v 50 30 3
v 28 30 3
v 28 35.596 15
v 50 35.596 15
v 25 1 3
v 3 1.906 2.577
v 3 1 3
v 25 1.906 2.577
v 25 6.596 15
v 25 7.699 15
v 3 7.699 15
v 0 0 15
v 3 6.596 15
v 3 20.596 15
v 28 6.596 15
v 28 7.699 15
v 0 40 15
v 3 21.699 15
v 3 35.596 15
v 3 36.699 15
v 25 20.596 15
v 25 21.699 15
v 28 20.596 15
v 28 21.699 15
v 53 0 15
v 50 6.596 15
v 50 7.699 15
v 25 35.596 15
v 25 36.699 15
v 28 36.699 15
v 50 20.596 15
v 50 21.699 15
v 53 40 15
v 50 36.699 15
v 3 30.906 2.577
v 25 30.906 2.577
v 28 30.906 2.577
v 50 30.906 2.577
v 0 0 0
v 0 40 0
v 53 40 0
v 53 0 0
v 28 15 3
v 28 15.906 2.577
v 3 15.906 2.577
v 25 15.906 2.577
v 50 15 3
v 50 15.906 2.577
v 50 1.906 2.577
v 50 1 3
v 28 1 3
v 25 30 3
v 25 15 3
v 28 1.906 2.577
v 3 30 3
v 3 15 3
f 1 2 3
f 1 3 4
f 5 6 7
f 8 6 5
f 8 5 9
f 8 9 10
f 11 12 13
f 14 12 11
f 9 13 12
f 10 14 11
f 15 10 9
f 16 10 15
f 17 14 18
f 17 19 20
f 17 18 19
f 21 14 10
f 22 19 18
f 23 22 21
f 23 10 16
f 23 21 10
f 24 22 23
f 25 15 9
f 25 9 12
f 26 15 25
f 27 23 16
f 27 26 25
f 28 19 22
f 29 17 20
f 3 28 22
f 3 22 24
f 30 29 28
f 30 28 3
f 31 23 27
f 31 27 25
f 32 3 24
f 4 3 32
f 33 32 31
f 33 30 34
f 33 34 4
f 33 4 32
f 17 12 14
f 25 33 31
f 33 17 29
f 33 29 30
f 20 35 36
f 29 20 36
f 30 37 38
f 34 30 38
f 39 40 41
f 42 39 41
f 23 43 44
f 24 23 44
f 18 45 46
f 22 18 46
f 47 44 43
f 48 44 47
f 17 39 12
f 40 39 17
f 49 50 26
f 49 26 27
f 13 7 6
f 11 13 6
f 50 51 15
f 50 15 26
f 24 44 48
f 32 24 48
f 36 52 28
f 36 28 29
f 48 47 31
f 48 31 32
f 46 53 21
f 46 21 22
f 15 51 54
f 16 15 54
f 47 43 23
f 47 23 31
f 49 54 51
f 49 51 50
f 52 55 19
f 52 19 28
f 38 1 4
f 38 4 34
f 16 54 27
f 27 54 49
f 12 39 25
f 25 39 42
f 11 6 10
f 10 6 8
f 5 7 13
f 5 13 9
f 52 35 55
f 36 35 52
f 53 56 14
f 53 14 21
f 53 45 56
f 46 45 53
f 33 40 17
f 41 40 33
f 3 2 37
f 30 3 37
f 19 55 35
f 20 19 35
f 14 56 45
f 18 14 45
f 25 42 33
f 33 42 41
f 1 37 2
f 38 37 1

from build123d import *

# Parameters (mm, degrees)
BOX001_W               = 22
BOX001_H               = 1
BOX001_DEPTH           = 15
BOX001_PLACEMENT_ANGLE = 335
BOX003_W               = 22
BOX003_H               = 1
BOX003_DEPTH           = 15
BOX003_PLACEMENT_ANGLE = 335
BOX006_W               = 22
BOX006_H               = 1
BOX006_DEPTH           = 15
BOX006_PLACEMENT_ANGLE = 335
BOX002_W               = 22
BOX002_H               = 1
BOX002_DEPTH           = 15
BOX002_PLACEMENT_ANGLE = 335
BOX004_W               = 22
BOX004_H               = 1
BOX004_DEPTH           = 15
BOX004_PLACEMENT_ANGLE = 335
BOX005_W               = 22
BOX005_H               = 1
BOX005_DEPTH           = 15
BOX005_PLACEMENT_ANGLE = 335
BOX_W                  = 53
BOX_H                  = 40
BOX_DEPTH              = 15


with BuildPart() as cube001:
    # Box001 → Box001 (new body)
    with BuildSketch(Plane.XY):
        with Locations((11, 0.5)):
            Rectangle(BOX001_W, BOX001_H)
    extrude(amount=BOX001_DEPTH)


with BuildPart() as cube001_1:
    # Box001 placement: moved
    add(cube001.part.moved(Location((3, 15, 3))).rotate(Axis((3, 15, 3), (1, 0, 0)), BOX001_PLACEMENT_ANGLE))


with BuildPart() as cube003:
    # Box003 → Box003 (new body)
    with BuildSketch(Plane.XY):
        with Locations((11, 0.5)):
            Rectangle(BOX003_W, BOX003_H)
    extrude(amount=BOX003_DEPTH)


with BuildPart() as cube003_1:
    # Box003 placement: moved
    add(cube003.part.moved(Location((3, 30, 3))).rotate(Axis((3, 30, 3), (1, 0, 0)), BOX003_PLACEMENT_ANGLE))


with BuildPart() as cube006:
    # Box006 → Box006 (new body)
    with BuildSketch(Plane.XY):
        with Locations((11, 0.5)):
            Rectangle(BOX006_W, BOX006_H)
    extrude(amount=BOX006_DEPTH)


with BuildPart() as cube006_1:
    # Box006 placement: moved
    add(cube006.part.moved(Location((28, 1, 3))).rotate(Axis((28, 1, 3), (1, 0, 0)), BOX006_PLACEMENT_ANGLE))


with BuildPart() as cube002:
    # Box002 → Box002 (new body)
    with BuildSketch(Plane.XY):
        with Locations((11, 0.5)):
            Rectangle(BOX002_W, BOX002_H)
    extrude(amount=BOX002_DEPTH)


with BuildPart() as cube002_1:
    # Box002 placement: moved
    add(cube002.part.moved(Location((28, 15, 3))).rotate(Axis((28, 15, 3), (1, 0, 0)), BOX002_PLACEMENT_ANGLE))


with BuildPart() as cube004:
    # Box004 → Box004 (new body)
    with BuildSketch(Plane.XY):
        with Locations((11, 0.5)):
            Rectangle(BOX004_W, BOX004_H)
    extrude(amount=BOX004_DEPTH)


with BuildPart() as cube004_1:
    # Box004 placement: moved
    add(cube004.part.moved(Location((28, 30, 3))).rotate(Axis((28, 30, 3), (1, 0, 0)), BOX004_PLACEMENT_ANGLE))


with BuildPart() as fusion:
    # Box005 → Box005 (new body)
    with BuildSketch(Plane.XY):
        with Locations((11, 0.5)):
            Rectangle(BOX005_W, BOX005_H)
    extrude(amount=BOX005_DEPTH)


with BuildPart() as fusion_1:
    # Box005 placement: moved
    add(fusion.part.moved(Location((3, 1, 3))).rotate(Axis((3, 1, 3), (1, 0, 0)), BOX005_PLACEMENT_ANGLE))

    # Fusion: union Cube001, Cube003, Cube006, Cube002, Cube004
    add(cube001_1.part)
    add(cube003_1.part)
    add(cube006_1.part)
    add(cube002_1.part)
    add(cube004_1.part)


with BuildPart() as cut:
    # Box → Box (new body)
    with BuildSketch(Plane.XY):
        with Locations((26.5, 20)):
            Rectangle(BOX_W, BOX_H)
    extrude(amount=BOX_DEPTH)

    # Cut: cut Fusion
    add(fusion_1.part, mode=Mode.SUBTRACT)


solid = cut.part
